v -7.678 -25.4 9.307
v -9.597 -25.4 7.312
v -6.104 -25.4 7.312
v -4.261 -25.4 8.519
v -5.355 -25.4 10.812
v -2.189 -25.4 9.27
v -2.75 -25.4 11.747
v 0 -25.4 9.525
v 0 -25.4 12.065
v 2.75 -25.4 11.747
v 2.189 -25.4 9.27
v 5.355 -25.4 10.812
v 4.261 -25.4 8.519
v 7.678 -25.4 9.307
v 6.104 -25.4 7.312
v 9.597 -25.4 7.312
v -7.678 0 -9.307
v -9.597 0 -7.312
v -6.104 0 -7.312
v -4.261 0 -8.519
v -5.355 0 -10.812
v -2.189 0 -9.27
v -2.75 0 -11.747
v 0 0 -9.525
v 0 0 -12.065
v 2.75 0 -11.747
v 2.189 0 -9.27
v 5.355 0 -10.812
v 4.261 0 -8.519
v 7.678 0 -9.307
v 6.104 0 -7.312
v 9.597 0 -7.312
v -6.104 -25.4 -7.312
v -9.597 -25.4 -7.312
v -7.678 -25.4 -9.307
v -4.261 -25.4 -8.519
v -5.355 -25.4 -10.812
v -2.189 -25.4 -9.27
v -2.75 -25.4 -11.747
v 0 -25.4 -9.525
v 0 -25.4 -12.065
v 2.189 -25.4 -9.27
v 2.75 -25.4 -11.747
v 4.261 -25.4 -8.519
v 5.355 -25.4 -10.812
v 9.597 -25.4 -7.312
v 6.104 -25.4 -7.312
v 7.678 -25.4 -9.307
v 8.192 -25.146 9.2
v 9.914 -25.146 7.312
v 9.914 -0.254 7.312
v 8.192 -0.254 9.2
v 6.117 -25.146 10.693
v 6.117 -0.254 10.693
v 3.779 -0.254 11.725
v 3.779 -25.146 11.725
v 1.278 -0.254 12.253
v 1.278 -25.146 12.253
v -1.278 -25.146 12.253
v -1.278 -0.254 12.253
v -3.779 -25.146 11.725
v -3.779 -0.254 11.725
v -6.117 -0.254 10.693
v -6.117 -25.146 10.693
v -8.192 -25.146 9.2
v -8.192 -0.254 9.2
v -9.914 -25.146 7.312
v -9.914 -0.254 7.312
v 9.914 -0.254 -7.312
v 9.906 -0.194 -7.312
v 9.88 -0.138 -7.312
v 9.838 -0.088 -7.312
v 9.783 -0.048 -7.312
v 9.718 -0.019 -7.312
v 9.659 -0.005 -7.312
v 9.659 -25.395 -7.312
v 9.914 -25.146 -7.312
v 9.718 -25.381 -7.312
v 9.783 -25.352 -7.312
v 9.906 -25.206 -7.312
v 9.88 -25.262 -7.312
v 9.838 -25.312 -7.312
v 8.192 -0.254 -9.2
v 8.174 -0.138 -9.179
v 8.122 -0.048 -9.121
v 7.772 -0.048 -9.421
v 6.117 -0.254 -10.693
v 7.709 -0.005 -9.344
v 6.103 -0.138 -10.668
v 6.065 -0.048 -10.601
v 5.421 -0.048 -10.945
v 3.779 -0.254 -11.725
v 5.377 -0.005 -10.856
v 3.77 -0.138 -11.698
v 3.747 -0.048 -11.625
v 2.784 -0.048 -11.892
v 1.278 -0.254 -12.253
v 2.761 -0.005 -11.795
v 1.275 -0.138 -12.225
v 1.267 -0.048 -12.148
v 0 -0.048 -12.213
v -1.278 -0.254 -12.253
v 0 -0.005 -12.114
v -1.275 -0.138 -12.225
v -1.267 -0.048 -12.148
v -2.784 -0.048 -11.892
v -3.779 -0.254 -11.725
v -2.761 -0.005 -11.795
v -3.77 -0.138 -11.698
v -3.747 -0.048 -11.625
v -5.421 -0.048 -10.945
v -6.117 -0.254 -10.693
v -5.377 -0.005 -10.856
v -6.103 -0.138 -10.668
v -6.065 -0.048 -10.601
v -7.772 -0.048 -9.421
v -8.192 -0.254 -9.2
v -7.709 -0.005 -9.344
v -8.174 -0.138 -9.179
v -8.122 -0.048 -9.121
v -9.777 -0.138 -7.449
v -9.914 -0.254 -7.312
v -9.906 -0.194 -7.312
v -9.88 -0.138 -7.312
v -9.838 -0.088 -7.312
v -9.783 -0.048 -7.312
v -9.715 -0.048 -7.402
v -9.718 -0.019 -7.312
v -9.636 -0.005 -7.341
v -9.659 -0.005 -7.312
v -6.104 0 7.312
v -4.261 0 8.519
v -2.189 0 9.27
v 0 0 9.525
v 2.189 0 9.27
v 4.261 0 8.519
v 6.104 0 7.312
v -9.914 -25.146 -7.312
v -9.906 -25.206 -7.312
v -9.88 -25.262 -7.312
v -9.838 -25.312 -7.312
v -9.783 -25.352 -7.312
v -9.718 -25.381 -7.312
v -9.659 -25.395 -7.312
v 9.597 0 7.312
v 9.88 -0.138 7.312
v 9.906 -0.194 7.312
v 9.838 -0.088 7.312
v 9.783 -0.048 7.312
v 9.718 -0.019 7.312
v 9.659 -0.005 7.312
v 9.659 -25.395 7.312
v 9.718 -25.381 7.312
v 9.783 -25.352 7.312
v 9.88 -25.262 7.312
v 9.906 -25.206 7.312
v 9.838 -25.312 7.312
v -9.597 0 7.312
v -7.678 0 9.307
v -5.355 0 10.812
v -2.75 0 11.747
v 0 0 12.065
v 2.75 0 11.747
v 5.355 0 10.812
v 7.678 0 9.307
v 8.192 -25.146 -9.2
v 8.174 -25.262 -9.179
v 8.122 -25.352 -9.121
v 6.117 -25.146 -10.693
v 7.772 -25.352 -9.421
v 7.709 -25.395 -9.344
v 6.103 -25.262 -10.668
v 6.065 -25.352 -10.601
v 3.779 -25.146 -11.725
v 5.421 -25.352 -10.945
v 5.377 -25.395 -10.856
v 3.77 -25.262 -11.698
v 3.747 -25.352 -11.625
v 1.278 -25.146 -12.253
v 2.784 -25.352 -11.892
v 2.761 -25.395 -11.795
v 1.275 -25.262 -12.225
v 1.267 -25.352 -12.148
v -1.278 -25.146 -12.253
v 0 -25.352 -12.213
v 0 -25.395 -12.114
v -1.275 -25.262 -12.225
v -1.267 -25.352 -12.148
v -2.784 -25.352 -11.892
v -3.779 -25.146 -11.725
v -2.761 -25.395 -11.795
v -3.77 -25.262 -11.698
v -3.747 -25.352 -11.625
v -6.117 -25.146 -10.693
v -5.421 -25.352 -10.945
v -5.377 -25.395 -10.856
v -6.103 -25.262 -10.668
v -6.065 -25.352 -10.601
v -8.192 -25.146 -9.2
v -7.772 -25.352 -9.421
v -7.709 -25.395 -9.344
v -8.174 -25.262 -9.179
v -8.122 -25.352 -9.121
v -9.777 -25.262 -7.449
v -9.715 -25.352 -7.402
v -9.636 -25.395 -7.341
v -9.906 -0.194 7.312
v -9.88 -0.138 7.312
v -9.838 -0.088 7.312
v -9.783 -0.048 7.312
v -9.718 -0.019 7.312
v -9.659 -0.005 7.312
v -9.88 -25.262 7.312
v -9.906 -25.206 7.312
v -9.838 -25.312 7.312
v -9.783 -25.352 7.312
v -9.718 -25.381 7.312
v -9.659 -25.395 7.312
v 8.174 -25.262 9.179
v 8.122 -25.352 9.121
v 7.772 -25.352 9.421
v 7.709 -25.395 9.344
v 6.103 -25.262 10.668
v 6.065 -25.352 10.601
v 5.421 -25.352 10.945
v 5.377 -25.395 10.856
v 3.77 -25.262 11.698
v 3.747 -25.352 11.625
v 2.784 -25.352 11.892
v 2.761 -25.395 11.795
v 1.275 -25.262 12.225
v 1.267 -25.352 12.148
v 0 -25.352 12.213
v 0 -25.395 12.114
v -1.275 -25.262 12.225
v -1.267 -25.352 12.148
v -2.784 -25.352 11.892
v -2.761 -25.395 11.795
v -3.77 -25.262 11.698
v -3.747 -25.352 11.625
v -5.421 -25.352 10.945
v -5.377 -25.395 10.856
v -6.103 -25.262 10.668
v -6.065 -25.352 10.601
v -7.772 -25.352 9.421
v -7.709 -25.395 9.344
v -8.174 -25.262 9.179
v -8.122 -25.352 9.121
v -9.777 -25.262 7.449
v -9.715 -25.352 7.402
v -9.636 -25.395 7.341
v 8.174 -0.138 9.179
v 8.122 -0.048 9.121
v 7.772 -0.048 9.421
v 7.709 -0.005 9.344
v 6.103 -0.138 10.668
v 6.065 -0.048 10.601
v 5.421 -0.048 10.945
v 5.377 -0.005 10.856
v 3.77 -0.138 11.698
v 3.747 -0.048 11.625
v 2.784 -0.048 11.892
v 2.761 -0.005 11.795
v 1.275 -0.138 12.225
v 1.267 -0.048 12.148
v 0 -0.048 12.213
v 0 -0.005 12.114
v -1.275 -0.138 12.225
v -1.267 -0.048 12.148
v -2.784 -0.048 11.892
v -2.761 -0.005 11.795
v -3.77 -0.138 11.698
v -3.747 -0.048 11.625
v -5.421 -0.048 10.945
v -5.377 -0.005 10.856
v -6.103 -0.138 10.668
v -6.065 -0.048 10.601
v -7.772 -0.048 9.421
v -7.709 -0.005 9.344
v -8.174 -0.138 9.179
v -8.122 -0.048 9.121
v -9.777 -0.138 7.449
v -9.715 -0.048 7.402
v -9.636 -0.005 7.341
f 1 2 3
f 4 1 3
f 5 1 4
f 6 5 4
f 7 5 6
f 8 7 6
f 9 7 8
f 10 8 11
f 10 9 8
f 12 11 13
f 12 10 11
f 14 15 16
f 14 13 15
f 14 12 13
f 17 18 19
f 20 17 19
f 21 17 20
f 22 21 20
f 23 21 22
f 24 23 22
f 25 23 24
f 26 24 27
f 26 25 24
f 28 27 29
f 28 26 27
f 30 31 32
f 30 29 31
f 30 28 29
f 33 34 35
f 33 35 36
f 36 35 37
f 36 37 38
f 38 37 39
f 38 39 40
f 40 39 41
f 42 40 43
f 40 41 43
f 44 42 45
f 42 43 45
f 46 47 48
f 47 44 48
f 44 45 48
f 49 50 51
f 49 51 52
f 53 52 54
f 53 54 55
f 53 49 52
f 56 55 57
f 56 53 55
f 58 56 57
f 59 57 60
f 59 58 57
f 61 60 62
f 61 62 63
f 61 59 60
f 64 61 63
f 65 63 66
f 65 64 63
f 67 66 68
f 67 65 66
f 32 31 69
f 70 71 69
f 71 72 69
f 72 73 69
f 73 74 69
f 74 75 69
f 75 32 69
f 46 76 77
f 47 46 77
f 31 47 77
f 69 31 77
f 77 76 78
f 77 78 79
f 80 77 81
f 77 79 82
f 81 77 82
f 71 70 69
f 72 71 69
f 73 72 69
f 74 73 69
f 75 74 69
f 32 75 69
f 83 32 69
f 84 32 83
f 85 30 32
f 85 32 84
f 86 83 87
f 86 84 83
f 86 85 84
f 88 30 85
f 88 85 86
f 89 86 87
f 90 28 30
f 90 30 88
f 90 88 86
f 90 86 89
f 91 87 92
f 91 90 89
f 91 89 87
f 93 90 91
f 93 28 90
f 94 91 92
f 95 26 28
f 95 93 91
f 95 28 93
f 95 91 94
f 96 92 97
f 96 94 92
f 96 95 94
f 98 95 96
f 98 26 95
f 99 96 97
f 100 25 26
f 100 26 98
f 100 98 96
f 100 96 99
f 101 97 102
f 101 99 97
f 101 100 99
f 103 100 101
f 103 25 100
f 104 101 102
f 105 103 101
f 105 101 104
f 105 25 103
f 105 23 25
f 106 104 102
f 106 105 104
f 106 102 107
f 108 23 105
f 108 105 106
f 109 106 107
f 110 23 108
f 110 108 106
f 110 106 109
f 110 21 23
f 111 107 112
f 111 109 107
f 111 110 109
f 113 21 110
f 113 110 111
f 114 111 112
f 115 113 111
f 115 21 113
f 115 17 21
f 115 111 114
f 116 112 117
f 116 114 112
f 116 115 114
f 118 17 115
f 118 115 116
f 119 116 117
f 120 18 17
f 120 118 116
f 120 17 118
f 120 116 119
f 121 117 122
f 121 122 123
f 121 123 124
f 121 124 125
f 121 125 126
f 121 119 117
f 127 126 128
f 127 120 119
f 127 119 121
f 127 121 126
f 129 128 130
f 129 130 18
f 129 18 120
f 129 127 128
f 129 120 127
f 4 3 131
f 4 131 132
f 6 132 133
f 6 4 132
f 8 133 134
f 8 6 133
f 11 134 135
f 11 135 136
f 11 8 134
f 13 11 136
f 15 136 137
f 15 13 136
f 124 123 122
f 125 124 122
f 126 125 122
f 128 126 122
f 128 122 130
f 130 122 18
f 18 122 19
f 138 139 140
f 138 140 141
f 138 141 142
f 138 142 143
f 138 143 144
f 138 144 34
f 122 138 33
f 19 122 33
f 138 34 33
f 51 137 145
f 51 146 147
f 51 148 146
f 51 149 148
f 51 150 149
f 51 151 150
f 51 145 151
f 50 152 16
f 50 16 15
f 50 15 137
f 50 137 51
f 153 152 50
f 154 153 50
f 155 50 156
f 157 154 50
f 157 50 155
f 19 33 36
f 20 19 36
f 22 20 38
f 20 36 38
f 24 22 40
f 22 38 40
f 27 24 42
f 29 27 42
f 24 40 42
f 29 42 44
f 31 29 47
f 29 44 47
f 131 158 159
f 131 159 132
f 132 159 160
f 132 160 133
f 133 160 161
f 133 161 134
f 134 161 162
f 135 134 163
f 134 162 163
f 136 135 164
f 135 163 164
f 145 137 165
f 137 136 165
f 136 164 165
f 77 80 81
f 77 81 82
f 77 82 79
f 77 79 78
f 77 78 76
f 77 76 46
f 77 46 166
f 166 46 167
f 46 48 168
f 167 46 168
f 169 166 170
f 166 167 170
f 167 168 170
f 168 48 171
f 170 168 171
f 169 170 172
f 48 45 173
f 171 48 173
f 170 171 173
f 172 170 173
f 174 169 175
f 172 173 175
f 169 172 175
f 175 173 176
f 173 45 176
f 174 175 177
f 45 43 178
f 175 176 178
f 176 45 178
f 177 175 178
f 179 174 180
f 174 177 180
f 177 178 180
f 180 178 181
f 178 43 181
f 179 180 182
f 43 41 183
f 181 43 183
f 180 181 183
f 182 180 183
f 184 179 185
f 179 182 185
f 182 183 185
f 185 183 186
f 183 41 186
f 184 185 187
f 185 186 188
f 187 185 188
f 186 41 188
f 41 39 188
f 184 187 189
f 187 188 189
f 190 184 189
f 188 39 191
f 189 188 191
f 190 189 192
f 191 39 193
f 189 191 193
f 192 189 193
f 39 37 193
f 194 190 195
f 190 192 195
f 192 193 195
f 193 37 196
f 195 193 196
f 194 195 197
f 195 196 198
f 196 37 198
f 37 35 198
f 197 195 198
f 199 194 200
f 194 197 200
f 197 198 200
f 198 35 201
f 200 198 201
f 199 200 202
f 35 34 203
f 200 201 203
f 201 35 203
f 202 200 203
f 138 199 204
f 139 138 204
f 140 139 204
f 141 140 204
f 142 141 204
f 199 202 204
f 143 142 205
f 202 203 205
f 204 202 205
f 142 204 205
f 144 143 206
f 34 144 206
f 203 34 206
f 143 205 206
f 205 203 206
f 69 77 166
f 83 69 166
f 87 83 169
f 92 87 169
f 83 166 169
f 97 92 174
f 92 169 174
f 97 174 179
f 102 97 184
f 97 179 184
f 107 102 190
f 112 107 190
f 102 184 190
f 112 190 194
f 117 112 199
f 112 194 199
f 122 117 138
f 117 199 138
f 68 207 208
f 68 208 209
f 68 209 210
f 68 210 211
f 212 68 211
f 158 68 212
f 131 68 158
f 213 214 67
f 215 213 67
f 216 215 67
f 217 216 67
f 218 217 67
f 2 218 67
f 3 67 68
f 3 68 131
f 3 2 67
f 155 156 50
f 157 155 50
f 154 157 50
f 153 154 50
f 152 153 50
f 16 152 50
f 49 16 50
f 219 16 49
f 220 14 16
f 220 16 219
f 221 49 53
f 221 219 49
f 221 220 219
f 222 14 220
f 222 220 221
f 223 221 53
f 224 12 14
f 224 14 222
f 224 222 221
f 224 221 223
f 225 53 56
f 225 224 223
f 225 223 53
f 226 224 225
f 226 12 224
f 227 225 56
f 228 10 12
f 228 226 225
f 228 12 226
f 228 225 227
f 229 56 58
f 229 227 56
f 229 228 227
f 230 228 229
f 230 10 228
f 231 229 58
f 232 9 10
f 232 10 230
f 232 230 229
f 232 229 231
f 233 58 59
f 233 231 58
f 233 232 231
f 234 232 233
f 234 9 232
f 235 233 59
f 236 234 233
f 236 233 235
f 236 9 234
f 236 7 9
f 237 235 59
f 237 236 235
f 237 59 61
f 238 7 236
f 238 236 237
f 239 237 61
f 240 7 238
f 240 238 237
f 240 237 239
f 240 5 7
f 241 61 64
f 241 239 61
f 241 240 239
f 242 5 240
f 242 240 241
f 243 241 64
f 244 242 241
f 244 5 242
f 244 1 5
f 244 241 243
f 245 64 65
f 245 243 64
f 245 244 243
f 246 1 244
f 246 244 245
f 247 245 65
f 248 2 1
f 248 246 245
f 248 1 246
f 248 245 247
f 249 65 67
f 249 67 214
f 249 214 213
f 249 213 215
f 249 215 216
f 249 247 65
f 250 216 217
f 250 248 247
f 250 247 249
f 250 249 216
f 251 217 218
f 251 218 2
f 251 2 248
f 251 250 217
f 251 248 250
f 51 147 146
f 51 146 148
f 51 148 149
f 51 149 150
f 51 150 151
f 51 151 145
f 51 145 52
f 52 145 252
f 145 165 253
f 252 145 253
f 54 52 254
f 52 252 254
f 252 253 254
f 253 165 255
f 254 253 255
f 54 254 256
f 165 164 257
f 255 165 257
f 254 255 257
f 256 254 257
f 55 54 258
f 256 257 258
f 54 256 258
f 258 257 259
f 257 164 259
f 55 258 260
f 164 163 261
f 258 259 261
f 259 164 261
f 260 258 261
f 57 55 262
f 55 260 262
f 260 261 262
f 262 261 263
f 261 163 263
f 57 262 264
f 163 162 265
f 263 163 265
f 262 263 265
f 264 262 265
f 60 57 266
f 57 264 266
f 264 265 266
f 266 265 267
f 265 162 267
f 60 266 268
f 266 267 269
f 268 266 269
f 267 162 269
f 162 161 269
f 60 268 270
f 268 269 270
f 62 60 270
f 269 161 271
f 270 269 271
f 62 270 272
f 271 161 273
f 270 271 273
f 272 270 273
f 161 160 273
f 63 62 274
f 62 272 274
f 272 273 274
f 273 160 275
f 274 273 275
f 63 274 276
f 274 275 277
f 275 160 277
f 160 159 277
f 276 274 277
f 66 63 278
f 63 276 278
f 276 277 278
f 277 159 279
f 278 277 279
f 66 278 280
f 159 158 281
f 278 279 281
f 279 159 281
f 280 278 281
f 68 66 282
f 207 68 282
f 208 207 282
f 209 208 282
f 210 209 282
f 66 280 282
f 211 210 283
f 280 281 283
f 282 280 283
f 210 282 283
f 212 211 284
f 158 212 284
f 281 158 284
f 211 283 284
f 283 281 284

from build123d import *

# Parameters (mm, degrees)
F0_R     = 12.319
F1_DEPTH = 25.4
F3_DEPTH = 25.4
F5_R     = 0.254
F5_2_R   = 0.254


with BuildPart() as f1:
    # F0 (on Front) → F1 (new body)
    with BuildSketch(Plane.XZ):
        Circle(F0_R)
    extrude(amount=F1_DEPTH)

    # F2 (on face) → F3 (intersect)
    with BuildSketch(Plane.XZ.offset(25.4)):
        with BuildLine():
            Line((6.1044666667, 7.3117105875), (9.9144666667, 7.3117105875))
            ThreePointArc((9.9144666667, 7.3117105875), (0, 12.319), (-9.9144666667, 7.3117105875))
            Line((-9.9144666667, 7.3117105875), (-6.1044666667, 7.3117105875))
            ThreePointArc((-6.1044666667, 7.3117105875), (0, 9.525), (6.1044666667, 7.3117105875))
        make_face()
    extrude(amount=-F3_DEPTH, mode=Mode.INTERSECT)


with BuildPart() as f4_1:
    # F4: instance of F1
    add(f1.part.mirror(Plane.XY))

    # F5#2
    f5_2_edges = [f4_1.edges().sort_by_distance(p)[0] for p in [
        (0, -25.4, -12.319),
        (0, 0, -12.319),
    ]]
    fillet(f5_2_edges, radius=F5_2_R)


with BuildPart() as f1_1:
    add(f1.part)

    # F5
    f5_edges = [f1_1.edges().sort_by_distance(p)[0] for p in [
        (0, -25.4, 12.319),
        (0, 0, 12.319),
    ]]
    fillet(f5_edges, radius=F5_R)


solid = Compound([f4_1.part, f1_1.part])
